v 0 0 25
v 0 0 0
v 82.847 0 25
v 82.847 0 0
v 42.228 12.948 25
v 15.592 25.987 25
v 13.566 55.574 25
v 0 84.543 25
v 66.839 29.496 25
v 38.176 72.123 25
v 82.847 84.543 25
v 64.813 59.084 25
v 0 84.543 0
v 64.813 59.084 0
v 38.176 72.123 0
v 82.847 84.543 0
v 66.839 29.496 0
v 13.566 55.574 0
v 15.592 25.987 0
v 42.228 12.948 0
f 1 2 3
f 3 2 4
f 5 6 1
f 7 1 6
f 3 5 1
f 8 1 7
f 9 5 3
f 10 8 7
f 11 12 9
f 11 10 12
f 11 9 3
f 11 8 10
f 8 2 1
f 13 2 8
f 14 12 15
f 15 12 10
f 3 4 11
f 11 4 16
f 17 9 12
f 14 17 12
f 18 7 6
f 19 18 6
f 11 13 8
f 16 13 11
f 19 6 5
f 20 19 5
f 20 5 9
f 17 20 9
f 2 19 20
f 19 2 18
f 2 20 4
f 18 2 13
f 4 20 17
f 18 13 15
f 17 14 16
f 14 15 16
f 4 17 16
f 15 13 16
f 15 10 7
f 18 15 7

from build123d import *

# Parameters (mm, degrees)
F0_W          = 82.8472673893
F0_H          = 84.5430567861
F1_DEPTH      = 25
F3_DEPTH      = 215.0975316763
F3_TAPER      = -3
F3_DEPTH_BACK = 25


with BuildPart() as f1:
    # F0 (on Top) → F1 (new body)
    with BuildSketch(Plane.XY):
        with Locations((41.4236336946, 42.271528393)):
            Rectangle(F0_W, F0_H)
    extrude(amount=F1_DEPTH)

    # F2 (on face) → F3 (cut, two sides)
    with BuildSketch(Plane.XY.offset(25)) as f3_sk:
        Polygon((66.8386592076, 29.4964735825), (64.8125708103, 59.0836033225), (38.1763206318, 72.1225241702), (13.5661588504, 55.5743152778), (15.5922472477, 25.9871855378), (42.2284974263, 12.9482646901), align=None)
    extrude(amount=F3_DEPTH, taper=F3_TAPER, mode=Mode.SUBTRACT)
    extrude(f3_sk.sketch, amount=-F3_DEPTH_BACK, mode=Mode.SUBTRACT)


solid = f1.part
